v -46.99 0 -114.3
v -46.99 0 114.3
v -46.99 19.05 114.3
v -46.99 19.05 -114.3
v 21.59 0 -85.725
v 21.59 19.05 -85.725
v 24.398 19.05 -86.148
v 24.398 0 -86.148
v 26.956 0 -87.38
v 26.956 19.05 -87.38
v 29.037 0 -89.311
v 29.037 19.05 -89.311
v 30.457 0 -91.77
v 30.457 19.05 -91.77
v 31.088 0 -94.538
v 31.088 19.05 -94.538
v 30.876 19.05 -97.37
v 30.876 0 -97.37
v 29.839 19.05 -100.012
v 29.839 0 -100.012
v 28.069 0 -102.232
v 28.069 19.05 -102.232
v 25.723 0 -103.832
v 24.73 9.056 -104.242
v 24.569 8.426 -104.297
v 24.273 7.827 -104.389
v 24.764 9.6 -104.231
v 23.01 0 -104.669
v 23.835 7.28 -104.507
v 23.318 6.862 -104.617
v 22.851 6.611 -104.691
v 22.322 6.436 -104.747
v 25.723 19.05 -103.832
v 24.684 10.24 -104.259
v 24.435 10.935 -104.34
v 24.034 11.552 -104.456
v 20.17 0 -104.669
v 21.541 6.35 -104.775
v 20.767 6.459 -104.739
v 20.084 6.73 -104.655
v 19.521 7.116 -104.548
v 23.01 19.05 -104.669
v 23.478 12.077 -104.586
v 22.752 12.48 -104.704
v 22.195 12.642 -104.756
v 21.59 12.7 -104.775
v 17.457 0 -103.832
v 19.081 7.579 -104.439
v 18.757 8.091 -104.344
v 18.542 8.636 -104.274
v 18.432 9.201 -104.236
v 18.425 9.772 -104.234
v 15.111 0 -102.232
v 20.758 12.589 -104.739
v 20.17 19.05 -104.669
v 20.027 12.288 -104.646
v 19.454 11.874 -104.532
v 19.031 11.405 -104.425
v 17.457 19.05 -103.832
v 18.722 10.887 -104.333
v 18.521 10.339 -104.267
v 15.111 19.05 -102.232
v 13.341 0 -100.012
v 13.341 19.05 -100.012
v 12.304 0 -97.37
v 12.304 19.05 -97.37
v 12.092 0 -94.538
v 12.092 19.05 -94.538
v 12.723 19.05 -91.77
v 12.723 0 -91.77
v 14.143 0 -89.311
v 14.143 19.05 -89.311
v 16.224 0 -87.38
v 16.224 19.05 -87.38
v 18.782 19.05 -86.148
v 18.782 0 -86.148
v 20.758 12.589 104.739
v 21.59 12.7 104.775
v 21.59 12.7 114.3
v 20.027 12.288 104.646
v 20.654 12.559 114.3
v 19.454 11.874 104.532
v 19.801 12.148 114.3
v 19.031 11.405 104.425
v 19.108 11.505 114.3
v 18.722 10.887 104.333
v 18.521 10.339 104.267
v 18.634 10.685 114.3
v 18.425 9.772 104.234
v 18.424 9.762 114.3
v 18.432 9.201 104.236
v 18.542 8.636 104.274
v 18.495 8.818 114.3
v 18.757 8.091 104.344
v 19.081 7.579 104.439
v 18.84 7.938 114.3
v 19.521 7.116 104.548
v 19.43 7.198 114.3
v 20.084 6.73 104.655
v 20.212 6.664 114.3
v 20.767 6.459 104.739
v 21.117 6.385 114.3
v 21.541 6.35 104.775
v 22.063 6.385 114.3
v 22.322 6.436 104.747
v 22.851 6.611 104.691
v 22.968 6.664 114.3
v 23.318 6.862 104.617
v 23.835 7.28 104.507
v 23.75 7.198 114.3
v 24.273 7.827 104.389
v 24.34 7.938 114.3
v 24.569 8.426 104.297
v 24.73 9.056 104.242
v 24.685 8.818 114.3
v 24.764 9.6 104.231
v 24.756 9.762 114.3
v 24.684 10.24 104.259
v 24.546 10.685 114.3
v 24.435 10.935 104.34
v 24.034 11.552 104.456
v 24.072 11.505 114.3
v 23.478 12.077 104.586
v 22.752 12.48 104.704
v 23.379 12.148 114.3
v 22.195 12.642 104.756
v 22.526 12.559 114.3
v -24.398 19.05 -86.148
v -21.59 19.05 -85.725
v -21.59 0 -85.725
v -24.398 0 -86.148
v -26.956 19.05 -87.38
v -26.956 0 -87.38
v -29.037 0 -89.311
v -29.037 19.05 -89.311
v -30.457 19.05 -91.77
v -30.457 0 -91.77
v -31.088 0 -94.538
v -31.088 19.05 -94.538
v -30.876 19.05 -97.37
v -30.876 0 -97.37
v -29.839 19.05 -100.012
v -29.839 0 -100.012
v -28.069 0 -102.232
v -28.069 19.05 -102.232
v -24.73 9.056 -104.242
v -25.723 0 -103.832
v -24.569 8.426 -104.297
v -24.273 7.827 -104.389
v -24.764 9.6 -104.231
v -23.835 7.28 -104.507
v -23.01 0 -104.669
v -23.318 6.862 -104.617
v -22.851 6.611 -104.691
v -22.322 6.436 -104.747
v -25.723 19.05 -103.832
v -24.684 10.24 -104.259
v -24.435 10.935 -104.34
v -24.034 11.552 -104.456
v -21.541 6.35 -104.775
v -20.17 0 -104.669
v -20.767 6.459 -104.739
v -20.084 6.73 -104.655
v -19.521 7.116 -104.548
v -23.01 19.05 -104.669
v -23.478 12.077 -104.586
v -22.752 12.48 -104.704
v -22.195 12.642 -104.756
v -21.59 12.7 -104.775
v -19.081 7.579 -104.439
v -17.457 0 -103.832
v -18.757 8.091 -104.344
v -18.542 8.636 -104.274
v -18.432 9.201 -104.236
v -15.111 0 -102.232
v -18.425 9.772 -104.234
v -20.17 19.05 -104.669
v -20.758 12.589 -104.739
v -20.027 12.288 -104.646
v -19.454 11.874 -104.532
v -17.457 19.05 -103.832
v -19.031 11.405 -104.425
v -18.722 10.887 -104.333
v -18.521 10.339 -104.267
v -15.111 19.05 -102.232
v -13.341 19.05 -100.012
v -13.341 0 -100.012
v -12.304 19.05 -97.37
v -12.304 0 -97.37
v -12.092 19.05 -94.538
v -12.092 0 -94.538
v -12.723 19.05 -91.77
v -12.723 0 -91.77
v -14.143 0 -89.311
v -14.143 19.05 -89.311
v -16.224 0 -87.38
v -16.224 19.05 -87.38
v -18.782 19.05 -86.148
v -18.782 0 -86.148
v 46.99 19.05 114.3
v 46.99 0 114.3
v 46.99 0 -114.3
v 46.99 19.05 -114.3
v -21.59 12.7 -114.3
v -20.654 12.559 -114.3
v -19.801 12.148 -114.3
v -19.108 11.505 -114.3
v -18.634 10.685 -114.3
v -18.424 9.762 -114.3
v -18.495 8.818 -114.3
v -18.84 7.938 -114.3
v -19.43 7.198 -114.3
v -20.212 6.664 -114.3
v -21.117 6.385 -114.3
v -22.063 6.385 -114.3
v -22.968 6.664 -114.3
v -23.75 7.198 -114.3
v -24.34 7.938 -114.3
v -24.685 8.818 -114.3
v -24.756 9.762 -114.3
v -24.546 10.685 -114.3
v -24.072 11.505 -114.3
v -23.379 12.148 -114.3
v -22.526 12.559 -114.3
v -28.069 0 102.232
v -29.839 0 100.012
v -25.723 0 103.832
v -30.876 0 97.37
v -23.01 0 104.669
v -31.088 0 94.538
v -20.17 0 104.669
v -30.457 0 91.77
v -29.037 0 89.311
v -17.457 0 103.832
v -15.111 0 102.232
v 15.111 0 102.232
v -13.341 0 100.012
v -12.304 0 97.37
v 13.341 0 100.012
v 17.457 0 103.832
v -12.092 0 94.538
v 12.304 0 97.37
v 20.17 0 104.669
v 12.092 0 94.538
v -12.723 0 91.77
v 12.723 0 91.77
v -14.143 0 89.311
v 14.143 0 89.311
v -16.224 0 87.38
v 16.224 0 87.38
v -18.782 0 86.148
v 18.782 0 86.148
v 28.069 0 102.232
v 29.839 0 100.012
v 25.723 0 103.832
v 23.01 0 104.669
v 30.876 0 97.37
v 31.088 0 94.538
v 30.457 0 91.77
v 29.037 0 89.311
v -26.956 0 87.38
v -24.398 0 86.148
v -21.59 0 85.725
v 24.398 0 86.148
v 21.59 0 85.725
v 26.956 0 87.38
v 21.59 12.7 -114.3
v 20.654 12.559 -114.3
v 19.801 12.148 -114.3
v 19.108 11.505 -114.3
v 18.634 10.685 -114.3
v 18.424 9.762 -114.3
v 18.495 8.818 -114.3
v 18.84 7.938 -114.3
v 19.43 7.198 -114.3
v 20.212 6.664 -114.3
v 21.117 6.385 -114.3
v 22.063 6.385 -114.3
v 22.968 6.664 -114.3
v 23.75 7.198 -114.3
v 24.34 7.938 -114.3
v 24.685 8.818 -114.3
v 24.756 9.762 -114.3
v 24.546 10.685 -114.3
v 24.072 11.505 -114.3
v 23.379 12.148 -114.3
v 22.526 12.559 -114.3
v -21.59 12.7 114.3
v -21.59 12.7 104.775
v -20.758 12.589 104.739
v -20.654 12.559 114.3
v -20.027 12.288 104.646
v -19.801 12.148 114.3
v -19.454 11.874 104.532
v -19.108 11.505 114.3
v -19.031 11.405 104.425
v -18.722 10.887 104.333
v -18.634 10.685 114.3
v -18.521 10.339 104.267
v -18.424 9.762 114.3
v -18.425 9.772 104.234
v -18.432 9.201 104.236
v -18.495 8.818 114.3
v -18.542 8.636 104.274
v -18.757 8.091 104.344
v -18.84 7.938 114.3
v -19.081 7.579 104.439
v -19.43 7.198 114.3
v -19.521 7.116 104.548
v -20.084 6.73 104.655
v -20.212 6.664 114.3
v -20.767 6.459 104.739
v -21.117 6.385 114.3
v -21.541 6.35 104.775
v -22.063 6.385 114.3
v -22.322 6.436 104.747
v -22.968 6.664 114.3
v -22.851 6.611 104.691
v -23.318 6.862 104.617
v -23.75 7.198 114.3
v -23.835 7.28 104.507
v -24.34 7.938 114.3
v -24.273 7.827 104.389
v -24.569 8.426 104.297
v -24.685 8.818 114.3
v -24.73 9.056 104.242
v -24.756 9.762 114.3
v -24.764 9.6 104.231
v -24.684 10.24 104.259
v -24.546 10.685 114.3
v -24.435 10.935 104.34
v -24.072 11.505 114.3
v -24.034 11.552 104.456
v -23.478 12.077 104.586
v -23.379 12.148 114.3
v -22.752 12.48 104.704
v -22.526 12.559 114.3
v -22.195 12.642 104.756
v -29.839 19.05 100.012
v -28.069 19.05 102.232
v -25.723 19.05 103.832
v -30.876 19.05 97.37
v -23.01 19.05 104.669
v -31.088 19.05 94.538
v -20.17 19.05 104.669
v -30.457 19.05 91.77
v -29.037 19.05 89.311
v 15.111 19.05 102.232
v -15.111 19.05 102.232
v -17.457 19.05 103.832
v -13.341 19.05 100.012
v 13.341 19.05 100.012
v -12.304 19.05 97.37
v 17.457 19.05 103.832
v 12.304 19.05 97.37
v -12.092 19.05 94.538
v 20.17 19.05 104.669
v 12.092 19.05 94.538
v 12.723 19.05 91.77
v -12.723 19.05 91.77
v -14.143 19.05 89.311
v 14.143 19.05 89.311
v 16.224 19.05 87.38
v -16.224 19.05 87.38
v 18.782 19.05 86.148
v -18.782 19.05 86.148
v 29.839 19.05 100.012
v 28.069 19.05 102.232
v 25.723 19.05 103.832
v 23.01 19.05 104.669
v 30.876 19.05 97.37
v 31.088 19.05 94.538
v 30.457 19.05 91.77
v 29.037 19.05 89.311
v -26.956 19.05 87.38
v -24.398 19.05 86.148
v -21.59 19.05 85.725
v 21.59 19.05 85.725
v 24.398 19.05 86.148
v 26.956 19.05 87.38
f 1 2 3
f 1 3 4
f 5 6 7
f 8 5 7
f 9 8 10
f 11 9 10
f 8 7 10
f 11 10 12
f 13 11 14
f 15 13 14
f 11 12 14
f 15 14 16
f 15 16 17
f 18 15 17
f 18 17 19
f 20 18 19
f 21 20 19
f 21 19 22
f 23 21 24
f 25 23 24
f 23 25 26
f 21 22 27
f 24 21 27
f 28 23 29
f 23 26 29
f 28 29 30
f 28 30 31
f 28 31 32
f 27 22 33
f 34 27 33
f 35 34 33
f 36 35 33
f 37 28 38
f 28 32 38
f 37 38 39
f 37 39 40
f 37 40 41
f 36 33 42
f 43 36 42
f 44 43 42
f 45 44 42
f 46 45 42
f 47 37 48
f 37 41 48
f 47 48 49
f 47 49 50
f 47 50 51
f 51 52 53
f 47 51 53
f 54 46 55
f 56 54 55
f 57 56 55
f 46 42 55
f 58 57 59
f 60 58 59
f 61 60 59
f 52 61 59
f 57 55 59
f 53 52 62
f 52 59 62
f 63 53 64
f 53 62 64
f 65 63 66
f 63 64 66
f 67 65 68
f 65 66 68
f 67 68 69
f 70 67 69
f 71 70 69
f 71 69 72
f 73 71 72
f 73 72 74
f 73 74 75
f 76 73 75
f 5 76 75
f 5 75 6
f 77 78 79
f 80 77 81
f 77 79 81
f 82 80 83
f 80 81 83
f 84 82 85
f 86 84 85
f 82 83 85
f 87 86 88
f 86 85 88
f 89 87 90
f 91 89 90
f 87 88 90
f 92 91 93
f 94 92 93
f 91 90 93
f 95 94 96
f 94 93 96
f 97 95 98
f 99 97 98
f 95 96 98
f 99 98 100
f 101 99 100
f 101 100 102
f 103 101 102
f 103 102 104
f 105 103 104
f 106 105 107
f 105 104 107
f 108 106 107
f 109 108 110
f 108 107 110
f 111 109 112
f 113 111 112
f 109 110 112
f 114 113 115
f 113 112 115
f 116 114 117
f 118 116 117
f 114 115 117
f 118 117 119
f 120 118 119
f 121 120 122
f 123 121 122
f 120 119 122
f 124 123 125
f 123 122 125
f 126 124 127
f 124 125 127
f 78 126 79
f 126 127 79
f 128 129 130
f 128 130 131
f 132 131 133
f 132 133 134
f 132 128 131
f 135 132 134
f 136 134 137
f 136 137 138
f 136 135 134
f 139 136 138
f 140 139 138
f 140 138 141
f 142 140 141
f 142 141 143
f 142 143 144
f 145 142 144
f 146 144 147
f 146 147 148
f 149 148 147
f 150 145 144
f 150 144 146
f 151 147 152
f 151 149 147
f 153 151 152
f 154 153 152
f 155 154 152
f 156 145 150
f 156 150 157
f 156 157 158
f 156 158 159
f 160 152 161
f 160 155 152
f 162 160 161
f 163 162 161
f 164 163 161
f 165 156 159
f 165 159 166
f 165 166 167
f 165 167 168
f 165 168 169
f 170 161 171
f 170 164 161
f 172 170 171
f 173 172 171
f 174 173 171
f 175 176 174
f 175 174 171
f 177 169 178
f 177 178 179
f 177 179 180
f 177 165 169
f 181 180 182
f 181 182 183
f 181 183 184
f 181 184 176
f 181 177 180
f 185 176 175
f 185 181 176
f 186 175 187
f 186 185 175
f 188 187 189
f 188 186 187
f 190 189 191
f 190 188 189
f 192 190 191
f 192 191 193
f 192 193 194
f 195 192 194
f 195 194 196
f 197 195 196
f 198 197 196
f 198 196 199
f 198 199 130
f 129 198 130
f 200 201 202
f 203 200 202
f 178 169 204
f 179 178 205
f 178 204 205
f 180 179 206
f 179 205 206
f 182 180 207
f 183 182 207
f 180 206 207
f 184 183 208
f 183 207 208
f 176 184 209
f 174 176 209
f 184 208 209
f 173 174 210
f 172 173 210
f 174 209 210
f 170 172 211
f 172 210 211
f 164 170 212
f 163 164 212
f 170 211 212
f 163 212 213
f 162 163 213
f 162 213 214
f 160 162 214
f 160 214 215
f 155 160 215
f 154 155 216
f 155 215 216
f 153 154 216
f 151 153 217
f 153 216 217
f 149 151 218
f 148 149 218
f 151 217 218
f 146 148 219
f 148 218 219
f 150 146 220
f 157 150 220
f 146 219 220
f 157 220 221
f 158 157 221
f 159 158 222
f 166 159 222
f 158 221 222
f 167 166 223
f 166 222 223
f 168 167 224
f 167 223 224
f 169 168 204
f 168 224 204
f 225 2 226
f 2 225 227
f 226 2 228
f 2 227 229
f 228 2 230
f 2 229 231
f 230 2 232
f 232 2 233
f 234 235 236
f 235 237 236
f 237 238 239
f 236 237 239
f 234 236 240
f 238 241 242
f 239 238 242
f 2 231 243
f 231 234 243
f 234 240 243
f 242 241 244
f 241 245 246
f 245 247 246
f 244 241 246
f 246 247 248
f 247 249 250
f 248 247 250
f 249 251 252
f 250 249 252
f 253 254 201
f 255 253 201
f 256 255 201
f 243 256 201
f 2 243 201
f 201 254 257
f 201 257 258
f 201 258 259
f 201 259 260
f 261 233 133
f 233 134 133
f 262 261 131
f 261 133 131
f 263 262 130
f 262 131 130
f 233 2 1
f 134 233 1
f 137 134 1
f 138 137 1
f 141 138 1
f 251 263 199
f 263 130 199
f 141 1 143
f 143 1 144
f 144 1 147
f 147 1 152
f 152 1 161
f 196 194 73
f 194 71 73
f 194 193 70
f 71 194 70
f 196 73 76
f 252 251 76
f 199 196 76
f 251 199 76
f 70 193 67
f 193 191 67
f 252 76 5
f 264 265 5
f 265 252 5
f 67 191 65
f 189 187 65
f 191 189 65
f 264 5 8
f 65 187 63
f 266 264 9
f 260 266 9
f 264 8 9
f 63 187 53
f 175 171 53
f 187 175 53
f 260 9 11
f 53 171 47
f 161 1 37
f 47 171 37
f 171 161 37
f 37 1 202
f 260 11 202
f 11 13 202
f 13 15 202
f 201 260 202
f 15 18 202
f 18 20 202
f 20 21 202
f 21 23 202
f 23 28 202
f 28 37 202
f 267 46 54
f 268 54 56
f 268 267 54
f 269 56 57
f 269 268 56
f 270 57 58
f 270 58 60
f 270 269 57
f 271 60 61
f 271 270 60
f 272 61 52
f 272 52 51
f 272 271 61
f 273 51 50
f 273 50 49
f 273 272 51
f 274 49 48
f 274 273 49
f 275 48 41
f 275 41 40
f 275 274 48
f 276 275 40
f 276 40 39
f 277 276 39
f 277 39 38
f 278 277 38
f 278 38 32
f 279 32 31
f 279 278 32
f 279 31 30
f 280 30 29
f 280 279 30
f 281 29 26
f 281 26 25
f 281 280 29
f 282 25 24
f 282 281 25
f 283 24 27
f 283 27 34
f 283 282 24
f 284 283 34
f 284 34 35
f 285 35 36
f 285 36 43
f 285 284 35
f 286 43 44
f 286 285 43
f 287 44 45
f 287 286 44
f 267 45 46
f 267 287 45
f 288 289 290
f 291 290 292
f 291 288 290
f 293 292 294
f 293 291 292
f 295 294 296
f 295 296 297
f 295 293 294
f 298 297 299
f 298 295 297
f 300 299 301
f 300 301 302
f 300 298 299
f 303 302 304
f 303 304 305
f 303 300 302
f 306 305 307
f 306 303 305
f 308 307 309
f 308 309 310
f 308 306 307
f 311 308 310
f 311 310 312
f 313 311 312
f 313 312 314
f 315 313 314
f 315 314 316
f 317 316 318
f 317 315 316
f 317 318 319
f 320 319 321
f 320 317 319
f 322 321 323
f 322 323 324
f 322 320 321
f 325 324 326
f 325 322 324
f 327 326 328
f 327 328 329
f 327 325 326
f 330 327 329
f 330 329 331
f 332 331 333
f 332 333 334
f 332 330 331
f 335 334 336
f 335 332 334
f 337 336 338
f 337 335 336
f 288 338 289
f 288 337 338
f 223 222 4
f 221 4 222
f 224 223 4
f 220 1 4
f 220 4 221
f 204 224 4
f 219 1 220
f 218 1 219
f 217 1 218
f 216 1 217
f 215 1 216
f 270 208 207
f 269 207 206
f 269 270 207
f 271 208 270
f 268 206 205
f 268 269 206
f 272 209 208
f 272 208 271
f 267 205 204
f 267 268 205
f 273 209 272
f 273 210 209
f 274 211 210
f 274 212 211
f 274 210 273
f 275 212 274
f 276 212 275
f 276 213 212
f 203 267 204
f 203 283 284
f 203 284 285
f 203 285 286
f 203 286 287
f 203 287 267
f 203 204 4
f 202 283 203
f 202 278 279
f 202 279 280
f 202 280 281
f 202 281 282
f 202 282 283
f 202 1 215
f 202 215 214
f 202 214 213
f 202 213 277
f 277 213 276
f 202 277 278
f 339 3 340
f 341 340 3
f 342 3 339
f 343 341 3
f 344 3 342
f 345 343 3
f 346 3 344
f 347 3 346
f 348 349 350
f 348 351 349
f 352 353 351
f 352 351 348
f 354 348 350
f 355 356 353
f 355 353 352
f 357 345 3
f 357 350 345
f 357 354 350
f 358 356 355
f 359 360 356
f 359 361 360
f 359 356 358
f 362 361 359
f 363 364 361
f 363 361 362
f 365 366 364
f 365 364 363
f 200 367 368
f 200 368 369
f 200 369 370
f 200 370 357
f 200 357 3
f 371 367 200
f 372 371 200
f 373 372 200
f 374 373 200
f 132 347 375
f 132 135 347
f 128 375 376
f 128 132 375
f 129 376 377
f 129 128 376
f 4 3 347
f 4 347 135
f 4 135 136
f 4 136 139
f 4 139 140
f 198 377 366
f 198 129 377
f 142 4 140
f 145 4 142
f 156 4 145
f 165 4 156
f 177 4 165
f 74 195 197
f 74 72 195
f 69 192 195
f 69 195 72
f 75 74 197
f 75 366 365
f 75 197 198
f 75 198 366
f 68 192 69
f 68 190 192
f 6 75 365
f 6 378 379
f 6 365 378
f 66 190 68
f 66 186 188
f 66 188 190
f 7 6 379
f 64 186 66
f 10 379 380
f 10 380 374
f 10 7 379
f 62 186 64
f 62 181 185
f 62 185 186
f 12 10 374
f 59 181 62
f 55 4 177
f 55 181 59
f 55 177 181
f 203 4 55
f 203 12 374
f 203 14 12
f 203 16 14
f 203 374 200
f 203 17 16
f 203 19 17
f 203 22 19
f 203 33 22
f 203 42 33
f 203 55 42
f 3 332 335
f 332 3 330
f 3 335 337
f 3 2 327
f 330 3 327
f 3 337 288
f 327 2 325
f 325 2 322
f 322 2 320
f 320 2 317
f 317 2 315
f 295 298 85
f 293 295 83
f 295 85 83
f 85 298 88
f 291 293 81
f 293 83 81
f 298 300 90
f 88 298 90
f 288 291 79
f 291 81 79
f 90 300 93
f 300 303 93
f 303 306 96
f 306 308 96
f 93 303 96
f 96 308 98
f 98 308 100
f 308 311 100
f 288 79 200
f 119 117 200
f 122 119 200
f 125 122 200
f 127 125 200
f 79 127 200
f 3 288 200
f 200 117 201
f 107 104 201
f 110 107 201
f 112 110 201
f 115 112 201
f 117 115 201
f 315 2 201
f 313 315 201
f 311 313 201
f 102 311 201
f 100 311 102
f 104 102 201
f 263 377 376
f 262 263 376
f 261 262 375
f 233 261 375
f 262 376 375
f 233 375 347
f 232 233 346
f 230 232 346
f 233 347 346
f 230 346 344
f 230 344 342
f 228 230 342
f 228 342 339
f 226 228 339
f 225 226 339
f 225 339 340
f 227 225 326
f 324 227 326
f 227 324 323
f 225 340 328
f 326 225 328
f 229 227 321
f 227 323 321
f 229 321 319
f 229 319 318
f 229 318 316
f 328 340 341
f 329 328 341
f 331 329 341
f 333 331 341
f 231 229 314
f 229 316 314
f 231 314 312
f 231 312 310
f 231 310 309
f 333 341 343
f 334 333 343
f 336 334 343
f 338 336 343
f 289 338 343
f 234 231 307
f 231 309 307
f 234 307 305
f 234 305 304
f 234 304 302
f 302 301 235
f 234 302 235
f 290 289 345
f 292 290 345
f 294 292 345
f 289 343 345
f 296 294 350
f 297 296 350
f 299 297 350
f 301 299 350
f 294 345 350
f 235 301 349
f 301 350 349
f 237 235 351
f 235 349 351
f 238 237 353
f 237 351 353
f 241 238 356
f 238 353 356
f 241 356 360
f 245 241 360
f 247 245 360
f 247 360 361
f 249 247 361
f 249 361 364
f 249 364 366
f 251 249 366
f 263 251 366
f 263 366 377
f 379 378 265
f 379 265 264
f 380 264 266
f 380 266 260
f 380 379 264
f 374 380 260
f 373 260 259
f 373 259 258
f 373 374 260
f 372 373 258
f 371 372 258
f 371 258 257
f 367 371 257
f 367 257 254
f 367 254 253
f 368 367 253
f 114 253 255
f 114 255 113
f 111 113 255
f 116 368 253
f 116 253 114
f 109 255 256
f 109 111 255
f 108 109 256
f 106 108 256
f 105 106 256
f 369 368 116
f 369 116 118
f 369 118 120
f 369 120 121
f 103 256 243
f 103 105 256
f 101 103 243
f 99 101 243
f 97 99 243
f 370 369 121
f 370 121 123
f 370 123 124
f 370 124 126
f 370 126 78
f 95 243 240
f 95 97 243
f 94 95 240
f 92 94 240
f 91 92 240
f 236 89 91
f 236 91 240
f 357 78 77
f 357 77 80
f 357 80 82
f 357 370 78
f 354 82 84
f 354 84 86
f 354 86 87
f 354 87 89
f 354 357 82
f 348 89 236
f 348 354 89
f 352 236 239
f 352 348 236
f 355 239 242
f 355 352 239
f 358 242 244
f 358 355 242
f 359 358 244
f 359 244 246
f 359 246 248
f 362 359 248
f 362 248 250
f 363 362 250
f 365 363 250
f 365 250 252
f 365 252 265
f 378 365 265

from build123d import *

# Parameters (mm, degrees)
SKETCH1_W           = 93.98
SKETCH1_H           = 228.6
BOSS_EXTRUDE1_DEPTH = 19.05


with BuildPart() as part:
    # Sketch1 → Boss-Extrude1 (new body)
    with BuildSketch(Plane(origin=(0, 0, 0), x_dir=(1, 0, 0), z_dir=(0, 1, 0))):
        Rectangle(SKETCH1_W, SKETCH1_H)
    extrude(amount=BOSS_EXTRUDE1_DEPTH)

    # Sketch2 → 3/4 (0.75) Diameter Hole1 (revolve, cut)
    with BuildSketch(Plane(origin=(-21.59, 19.05, -95.25), x_dir=(0, 0, 1), z_dir=(1, 0, 0))):
        Polygon((0, 0), (0, 24.773197396), (9.525, 19.05), (9.525, 0), align=None)
    f_3_4_0_75_diameter_hole1 = revolve(axis=Axis((-21.59, 25.4, -95.25), (0, -1, 0)), mode=Mode.SUBTRACT)

    # Mirror1: 3/4 (0.75) Diameter Hole1 across plane
    add(f_3_4_0_75_diameter_hole1.mirror(Plane.XY), mode=Mode.SUBTRACT)

    # Mirror4: 3/4 (0.75) Diameter Hole1 across plane
    add(f_3_4_0_75_diameter_hole1.mirror(Plane(origin=(0, 0, 0), x_dir=(0, 0, 1), z_dir=(1, 0, 0))), mode=Mode.SUBTRACT)

    # Mirror4 copy 1 sketch → Mirror4 copy 1 (revolve, cut)
    with BuildSketch(Plane(origin=(21.59, 19.05, 95.25), x_dir=(0, 0, -1), z_dir=(-1, 0, 0))):
        Polygon((0, 0), (0, 24.773197396), (9.525, 19.05), (9.525, 0), align=None)
    revolve(axis=Axis((21.59, 25.4, 95.25), (0, -1, 0)), mode=Mode.SUBTRACT)

    # Sketch4 → 1/4 (0.25) Diameter Hole1 (revolve, cut)
    with BuildSketch(Plane(origin=(21.59, 9.525, -114.3), x_dir=(0, 1, 0), z_dir=(1, 0, 0))):
        Polygon((0, 0), (0, 20.957732465), (3.175, 19.05), (3.175, 0), align=None)
    f_1_4_0_25_diameter_hole1 = revolve(axis=Axis((21.59, 9.525, -120.65), (0, 0, 1)), mode=Mode.SUBTRACT)

    # Mirror5: 1/4 (0.25) Diameter Hole1 across plane
    add(f_1_4_0_25_diameter_hole1.mirror(Plane.XY), mode=Mode.SUBTRACT)

    # Mirror10: 1/4 (0.25) Diameter Hole1 across plane
    add(f_1_4_0_25_diameter_hole1.mirror(Plane(origin=(0, 0, 0), x_dir=(0, 0, 1), z_dir=(1, 0, 0))), mode=Mode.SUBTRACT)

    # Mirror10 copy 1 sketch → Mirror10 copy 1 (revolve, cut)
    with BuildSketch(Plane(origin=(-21.59, 9.525, 114.3), x_dir=(0, 1, 0), z_dir=(-1, 0, 0))):
        Polygon((0, 0), (0, 20.957732465), (3.175, 19.05), (3.175, 0), align=None)
    revolve(axis=Axis((-21.59, 9.525, 120.65), (0, 0, -1)), mode=Mode.SUBTRACT)


solid = part.part
